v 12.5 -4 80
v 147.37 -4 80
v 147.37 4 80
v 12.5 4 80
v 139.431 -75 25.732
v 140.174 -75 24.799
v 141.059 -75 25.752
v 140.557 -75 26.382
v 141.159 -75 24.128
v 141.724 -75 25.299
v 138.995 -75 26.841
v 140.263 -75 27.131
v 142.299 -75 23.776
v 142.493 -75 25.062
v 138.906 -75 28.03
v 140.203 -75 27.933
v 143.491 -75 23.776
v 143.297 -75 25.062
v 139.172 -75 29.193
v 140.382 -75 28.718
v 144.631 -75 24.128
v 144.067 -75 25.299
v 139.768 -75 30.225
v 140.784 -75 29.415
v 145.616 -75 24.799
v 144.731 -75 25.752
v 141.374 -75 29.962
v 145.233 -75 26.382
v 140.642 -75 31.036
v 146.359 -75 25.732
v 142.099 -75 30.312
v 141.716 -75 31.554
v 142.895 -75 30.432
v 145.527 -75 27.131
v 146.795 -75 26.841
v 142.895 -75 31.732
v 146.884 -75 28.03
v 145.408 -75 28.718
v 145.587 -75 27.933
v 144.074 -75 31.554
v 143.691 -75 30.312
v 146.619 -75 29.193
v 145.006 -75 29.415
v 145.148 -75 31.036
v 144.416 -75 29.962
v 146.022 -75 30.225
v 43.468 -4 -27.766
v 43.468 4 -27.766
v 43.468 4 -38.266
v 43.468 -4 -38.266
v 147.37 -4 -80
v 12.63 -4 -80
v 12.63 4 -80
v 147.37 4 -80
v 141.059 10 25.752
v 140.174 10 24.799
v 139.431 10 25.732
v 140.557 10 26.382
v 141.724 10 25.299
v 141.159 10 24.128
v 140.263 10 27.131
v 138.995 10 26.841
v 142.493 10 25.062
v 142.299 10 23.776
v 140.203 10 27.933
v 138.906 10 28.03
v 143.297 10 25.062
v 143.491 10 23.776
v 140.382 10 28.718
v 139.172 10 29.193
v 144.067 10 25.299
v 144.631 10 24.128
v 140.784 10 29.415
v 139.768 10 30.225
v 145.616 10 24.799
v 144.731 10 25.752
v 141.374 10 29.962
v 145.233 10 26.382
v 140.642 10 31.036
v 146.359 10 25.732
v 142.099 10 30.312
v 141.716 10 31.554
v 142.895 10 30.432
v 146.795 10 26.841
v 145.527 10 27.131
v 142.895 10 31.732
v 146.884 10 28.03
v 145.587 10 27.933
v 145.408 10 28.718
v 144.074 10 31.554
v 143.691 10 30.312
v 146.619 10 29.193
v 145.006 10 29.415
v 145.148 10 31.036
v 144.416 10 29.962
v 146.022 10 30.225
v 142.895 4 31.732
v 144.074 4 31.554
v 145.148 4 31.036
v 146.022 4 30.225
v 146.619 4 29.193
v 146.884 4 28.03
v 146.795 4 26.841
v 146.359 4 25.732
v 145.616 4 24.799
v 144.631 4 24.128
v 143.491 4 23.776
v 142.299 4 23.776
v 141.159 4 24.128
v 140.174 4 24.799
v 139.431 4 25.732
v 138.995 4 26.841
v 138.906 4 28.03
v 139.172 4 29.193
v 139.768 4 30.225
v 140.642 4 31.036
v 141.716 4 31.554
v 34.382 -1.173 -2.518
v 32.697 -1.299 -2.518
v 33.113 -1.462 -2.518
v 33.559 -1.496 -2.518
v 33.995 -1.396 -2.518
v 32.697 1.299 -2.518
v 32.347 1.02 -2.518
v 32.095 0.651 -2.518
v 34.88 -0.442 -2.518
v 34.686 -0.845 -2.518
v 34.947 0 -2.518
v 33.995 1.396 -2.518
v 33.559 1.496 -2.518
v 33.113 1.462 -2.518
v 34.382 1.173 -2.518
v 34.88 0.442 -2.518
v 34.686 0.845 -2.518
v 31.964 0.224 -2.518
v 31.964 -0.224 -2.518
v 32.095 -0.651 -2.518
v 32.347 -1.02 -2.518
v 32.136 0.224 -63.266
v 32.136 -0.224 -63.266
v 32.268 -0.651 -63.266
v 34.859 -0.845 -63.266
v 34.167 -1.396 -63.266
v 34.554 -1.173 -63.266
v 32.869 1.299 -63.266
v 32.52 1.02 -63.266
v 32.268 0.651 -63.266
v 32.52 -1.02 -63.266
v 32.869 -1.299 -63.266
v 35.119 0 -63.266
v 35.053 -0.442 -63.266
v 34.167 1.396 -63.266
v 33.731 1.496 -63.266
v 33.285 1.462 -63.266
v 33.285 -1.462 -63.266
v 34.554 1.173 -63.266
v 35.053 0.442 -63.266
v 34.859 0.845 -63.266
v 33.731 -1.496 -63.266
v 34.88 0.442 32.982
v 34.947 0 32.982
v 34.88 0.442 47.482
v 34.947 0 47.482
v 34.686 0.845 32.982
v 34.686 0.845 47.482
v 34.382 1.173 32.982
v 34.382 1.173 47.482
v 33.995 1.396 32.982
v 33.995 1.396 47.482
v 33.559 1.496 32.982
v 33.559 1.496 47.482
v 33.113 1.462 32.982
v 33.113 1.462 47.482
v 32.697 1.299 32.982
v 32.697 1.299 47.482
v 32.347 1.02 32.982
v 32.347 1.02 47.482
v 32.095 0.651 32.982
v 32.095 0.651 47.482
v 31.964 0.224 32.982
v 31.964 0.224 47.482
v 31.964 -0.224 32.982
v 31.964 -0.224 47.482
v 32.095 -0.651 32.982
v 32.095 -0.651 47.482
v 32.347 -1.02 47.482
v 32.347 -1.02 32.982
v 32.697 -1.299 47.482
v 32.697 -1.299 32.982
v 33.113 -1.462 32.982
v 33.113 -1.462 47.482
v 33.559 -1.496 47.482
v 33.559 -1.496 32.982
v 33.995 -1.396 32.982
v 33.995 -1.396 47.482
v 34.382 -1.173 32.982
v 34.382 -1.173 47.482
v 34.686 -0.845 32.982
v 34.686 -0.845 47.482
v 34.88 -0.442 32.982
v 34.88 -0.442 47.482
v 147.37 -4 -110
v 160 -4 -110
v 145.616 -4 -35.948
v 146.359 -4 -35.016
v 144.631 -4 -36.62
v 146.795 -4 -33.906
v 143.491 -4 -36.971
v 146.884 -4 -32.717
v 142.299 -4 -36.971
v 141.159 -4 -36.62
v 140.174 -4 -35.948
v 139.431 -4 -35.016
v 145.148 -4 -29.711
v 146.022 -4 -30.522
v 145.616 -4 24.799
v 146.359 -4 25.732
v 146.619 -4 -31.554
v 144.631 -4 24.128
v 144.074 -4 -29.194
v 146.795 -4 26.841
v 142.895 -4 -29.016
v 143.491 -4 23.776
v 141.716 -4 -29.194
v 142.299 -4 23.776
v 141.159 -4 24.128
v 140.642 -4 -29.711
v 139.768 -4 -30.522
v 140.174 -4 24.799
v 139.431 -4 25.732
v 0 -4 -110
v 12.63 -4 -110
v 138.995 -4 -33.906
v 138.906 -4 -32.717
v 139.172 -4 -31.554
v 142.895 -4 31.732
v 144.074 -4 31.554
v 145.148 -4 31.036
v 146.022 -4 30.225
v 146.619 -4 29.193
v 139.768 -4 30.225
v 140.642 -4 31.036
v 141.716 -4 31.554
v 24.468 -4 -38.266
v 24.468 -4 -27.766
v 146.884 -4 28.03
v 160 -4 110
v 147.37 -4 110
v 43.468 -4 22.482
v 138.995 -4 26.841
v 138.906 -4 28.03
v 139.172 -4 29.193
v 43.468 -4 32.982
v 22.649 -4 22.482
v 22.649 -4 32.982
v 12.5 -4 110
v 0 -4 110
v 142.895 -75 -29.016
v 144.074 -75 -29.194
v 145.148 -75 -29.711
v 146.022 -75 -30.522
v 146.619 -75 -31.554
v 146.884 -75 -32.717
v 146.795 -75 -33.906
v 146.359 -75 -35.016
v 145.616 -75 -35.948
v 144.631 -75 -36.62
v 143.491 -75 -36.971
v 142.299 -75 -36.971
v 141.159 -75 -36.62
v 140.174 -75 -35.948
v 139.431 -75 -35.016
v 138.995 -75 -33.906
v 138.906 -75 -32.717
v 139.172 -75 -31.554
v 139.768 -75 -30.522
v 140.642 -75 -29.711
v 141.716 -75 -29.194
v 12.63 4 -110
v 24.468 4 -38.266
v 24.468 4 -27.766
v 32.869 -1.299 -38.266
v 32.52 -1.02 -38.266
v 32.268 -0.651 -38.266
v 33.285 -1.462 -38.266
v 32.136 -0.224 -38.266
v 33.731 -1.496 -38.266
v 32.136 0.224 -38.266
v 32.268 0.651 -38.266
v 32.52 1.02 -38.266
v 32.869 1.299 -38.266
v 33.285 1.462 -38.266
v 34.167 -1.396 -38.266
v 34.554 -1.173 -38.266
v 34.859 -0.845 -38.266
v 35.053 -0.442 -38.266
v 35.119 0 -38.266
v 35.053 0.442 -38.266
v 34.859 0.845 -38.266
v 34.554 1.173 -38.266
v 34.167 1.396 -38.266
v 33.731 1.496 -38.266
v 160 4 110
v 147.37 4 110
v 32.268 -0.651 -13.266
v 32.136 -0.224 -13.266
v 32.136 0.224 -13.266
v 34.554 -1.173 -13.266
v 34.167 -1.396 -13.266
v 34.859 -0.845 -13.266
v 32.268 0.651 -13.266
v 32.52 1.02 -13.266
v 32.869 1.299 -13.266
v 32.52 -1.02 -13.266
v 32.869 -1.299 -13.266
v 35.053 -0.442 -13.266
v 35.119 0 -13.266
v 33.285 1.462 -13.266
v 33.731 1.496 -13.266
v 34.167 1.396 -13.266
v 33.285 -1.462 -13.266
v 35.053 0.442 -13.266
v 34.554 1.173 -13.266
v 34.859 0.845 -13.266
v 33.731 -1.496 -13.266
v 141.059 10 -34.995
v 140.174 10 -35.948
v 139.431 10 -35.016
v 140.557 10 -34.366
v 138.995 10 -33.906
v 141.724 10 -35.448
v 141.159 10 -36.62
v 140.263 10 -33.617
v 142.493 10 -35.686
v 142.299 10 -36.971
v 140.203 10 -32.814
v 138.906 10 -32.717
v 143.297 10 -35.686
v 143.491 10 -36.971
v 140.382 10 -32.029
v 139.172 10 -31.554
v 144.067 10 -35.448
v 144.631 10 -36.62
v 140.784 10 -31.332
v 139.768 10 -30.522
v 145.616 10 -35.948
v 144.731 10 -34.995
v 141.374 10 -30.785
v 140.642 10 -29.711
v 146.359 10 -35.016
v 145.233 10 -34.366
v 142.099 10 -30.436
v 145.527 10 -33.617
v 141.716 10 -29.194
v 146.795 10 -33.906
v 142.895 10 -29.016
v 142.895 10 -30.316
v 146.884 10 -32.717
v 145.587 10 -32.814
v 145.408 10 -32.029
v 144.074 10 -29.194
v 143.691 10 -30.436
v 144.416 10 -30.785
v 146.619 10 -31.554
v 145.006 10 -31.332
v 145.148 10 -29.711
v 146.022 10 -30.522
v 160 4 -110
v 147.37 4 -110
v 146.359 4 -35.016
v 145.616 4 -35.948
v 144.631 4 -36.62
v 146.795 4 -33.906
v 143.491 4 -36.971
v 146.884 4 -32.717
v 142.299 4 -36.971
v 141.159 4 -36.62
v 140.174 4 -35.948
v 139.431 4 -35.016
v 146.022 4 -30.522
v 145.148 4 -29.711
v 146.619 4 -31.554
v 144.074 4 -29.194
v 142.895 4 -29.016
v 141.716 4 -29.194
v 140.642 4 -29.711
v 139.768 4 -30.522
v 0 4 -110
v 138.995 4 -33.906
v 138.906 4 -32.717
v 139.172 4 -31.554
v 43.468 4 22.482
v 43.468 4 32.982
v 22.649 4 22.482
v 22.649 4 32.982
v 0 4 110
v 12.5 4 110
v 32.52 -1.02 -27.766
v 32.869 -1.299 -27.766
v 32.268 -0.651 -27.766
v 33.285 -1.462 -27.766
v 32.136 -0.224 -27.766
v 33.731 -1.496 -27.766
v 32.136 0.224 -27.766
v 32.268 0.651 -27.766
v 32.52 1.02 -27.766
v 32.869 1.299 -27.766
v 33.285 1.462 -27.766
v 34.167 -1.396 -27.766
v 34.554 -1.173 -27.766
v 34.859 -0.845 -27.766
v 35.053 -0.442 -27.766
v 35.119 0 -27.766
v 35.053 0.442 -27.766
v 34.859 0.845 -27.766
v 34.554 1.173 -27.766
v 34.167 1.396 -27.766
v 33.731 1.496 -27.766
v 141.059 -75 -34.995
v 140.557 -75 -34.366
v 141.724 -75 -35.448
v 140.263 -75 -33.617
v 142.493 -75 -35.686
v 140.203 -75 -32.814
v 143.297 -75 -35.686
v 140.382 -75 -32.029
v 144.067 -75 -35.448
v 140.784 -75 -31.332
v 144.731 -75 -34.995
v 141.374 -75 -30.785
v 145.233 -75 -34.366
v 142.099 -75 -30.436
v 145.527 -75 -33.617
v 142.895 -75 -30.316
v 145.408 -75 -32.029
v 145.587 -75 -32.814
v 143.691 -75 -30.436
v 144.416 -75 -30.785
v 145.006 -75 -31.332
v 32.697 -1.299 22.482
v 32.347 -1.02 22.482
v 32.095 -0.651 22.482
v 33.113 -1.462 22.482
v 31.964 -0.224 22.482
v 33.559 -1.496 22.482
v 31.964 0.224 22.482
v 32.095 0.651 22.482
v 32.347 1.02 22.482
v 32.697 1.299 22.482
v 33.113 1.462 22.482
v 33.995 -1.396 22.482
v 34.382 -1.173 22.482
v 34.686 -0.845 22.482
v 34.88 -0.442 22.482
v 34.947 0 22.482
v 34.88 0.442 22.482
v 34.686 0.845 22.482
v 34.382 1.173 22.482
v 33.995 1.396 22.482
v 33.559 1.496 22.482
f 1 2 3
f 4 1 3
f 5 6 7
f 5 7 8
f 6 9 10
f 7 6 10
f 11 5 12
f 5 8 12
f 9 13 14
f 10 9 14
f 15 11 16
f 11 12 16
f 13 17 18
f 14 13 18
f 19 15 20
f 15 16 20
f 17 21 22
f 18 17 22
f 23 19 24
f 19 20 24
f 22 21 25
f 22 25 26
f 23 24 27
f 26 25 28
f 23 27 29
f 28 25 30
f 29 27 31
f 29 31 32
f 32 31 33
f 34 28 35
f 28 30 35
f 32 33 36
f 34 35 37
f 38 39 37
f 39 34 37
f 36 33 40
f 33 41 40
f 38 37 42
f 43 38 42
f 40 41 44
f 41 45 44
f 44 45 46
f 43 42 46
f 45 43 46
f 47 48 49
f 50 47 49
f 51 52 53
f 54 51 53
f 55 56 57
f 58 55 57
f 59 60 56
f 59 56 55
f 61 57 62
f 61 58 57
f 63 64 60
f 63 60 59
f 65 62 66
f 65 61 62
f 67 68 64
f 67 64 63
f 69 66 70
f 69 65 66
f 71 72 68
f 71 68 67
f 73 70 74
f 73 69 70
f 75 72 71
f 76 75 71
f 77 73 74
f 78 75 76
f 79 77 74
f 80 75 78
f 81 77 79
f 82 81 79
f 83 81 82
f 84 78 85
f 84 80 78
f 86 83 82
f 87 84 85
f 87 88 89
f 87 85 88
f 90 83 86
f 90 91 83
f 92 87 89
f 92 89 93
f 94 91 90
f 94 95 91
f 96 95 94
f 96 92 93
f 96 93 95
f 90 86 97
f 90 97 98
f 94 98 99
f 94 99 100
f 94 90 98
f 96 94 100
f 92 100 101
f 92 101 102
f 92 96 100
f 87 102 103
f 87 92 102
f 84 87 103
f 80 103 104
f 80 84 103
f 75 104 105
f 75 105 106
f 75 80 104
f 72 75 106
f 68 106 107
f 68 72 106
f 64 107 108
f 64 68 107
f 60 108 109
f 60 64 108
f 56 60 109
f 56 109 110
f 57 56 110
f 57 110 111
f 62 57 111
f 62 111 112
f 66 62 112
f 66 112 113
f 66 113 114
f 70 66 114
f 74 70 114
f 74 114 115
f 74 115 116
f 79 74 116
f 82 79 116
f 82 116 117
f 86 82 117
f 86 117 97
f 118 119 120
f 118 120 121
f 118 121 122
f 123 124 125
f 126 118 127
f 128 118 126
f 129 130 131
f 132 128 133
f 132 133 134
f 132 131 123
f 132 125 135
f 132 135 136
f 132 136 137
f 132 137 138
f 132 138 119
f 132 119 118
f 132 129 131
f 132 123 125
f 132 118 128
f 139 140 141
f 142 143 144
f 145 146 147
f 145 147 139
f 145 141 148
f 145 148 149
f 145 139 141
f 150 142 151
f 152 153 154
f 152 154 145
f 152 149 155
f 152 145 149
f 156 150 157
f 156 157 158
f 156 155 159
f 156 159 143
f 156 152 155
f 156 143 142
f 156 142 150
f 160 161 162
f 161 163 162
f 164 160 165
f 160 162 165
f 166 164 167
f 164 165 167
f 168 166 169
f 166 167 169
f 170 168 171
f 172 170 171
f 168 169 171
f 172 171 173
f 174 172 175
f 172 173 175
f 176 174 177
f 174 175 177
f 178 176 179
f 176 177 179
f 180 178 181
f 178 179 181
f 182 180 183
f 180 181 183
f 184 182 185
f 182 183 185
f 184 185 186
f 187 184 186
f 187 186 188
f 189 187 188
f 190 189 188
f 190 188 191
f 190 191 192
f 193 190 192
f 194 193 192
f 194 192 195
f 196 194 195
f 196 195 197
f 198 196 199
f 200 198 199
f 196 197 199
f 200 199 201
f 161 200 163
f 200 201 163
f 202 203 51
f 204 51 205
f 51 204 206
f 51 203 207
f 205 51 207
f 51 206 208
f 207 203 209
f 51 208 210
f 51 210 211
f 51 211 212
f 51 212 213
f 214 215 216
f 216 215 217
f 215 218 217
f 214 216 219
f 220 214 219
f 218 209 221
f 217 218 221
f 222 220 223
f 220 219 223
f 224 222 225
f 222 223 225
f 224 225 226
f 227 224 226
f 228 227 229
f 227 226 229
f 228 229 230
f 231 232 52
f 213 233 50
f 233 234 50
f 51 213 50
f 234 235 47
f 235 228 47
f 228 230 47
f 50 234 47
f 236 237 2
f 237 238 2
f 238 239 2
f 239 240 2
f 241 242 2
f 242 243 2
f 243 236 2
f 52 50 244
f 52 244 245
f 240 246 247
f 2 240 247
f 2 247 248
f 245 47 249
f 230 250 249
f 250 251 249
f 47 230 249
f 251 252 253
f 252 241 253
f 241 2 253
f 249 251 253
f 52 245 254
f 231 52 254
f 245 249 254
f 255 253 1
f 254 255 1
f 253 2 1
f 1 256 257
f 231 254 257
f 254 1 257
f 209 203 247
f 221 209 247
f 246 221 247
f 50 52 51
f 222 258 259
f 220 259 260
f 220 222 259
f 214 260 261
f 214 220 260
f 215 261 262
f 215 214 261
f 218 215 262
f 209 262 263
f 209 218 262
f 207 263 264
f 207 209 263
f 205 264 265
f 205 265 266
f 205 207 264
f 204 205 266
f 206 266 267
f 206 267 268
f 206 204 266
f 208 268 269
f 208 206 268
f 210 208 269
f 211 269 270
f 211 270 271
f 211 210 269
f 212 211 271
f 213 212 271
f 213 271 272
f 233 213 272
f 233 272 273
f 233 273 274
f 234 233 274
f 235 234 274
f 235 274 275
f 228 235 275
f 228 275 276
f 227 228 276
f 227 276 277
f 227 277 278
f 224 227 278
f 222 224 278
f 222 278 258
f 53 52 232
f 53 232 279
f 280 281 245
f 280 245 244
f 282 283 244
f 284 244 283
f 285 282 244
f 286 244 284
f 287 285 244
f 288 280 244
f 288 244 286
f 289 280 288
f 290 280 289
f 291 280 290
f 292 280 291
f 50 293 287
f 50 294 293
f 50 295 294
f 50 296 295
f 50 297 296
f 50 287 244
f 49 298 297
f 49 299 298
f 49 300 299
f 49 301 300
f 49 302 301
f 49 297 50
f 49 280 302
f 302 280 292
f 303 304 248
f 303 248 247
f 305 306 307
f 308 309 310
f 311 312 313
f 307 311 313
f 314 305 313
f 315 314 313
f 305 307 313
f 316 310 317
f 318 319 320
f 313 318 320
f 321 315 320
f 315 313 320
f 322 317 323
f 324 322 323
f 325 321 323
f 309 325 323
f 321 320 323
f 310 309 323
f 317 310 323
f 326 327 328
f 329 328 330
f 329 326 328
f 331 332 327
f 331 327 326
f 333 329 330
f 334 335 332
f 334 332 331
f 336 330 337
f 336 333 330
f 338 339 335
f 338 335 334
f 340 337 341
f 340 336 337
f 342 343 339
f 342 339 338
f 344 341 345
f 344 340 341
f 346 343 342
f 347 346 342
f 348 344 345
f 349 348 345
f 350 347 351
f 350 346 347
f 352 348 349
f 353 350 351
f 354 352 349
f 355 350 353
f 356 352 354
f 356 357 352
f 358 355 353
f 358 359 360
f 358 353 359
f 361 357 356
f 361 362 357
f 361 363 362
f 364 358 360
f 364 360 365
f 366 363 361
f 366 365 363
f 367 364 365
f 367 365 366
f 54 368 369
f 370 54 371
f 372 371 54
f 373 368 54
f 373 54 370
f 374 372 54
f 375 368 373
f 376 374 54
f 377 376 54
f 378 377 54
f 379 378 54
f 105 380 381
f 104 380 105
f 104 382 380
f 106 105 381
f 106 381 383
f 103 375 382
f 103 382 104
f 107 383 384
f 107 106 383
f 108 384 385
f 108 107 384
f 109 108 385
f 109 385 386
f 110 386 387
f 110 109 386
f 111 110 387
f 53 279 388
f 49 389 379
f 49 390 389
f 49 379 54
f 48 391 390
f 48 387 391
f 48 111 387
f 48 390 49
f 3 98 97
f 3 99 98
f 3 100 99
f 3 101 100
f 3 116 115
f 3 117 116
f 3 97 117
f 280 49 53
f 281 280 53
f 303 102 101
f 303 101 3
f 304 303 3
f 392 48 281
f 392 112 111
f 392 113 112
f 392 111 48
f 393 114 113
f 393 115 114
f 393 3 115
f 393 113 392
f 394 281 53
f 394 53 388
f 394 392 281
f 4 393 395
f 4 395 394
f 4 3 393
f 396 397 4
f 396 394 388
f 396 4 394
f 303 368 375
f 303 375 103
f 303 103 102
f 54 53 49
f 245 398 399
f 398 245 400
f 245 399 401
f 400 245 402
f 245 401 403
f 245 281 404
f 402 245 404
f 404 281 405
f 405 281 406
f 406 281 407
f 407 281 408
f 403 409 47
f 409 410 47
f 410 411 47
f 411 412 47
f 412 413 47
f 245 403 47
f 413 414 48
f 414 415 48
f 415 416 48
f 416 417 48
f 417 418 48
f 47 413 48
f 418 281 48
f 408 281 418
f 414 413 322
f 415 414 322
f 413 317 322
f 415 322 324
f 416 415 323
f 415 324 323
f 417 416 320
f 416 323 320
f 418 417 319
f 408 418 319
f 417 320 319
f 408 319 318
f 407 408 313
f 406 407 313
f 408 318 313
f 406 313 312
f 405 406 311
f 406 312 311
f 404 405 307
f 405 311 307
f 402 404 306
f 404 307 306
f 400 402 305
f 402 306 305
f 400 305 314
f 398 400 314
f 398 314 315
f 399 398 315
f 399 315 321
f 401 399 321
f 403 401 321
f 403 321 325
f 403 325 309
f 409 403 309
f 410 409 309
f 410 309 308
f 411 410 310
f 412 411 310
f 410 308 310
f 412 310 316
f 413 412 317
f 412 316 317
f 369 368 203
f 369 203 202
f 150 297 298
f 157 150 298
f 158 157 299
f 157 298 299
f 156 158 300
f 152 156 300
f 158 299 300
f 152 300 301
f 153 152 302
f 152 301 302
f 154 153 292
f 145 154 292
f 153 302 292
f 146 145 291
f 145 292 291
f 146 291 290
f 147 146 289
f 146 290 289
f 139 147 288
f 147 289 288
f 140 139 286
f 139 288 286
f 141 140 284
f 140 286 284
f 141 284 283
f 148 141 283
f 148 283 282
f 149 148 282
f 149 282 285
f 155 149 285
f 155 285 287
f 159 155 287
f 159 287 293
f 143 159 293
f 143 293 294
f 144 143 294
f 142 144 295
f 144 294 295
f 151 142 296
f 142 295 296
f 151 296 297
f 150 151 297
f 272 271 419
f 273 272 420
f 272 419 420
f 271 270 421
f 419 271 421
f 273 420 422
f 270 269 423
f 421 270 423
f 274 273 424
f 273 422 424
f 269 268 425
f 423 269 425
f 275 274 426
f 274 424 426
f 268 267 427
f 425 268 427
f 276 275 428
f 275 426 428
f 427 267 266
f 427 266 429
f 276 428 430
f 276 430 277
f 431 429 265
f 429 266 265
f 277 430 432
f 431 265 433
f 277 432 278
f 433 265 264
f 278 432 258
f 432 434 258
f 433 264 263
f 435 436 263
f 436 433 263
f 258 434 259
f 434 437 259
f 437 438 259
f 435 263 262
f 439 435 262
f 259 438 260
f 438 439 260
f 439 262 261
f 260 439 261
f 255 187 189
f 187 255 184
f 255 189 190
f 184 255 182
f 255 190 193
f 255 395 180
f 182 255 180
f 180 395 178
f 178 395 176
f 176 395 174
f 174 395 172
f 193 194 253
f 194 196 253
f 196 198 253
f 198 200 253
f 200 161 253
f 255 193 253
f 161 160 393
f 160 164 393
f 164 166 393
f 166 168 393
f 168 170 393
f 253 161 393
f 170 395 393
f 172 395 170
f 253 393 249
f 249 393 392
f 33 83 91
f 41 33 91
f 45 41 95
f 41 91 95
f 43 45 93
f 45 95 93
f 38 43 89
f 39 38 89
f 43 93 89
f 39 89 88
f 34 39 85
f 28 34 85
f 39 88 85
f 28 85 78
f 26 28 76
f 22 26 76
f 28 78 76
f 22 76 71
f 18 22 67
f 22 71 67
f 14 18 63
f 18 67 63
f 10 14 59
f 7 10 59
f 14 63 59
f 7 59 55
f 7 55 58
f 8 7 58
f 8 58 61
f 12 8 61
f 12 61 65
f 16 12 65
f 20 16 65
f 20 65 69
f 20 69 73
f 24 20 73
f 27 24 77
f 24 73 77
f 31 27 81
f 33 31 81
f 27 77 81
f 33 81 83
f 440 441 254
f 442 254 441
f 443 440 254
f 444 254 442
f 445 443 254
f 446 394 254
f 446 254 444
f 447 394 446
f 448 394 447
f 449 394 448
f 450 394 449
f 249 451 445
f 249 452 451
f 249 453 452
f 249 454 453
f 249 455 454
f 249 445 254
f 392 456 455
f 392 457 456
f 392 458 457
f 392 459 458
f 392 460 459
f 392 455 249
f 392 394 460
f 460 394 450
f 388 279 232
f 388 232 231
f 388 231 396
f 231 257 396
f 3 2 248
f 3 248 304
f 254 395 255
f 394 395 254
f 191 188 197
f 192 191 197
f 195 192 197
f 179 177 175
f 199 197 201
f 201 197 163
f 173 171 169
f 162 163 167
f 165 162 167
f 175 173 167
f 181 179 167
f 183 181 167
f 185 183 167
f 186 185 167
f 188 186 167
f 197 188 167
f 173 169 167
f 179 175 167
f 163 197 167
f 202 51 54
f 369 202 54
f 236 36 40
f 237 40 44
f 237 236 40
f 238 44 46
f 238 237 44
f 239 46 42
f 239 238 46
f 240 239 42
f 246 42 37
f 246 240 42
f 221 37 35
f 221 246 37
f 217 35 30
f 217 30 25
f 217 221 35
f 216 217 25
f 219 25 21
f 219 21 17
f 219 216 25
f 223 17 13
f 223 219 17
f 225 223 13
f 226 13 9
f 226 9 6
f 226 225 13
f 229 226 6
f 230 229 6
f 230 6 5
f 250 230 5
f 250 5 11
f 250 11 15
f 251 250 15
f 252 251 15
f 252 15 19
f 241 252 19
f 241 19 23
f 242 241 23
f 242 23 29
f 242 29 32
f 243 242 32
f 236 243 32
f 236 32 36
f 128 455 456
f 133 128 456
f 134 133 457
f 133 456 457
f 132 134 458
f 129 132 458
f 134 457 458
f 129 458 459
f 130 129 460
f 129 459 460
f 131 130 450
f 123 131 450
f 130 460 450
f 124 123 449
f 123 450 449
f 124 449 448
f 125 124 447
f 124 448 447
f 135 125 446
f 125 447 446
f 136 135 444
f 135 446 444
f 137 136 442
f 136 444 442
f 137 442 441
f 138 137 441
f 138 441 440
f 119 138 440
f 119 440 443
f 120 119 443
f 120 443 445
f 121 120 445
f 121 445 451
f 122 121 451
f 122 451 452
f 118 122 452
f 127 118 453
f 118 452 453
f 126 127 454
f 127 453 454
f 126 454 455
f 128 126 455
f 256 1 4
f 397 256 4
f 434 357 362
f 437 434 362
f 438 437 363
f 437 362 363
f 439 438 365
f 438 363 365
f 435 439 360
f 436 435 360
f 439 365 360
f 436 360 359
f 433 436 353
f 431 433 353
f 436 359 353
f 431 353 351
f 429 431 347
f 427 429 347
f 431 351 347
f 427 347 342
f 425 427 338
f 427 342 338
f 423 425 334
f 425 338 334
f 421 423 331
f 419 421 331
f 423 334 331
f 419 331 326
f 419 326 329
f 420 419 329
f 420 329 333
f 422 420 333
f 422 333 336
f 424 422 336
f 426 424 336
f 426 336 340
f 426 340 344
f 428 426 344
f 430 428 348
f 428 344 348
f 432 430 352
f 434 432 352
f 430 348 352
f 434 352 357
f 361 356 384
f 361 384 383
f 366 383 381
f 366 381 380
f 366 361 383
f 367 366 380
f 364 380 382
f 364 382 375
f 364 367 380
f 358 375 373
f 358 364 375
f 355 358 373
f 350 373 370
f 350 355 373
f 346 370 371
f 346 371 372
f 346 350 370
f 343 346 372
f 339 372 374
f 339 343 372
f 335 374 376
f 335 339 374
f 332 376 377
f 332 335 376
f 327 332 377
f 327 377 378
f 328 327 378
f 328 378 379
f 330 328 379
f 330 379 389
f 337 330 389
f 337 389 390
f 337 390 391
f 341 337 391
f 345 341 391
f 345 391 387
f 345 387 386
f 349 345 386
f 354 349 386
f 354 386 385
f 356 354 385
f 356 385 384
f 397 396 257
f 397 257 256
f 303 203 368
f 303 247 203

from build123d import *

# Parameters (mm, degrees)
SKETCH1_W           = 160
SKETCH1_H           = 8
BOSS_EXTRUDE1_DEPTH = 160
SKETCH2_W           = 12.5
SKETCH2_H           = 8
BOSS_EXTRUDE2_DEPTH = 30
SKETCH3_W           = 12.63
SKETCH3_H           = 8
BOSS_EXTRUDE3_DEPTH = 30
SKETCH4_W           = 12.63
SKETCH4_H           = 8
BOSS_EXTRUDE4_DEPTH = 30
SKETCH5_W           = 12.63
SKETCH5_H           = 8
BOSS_EXTRUDE5_DEPTH = 30
SKETCH6_W           = 19
SKETCH6_H           = 10.5
SKETCH6_W_2         = 20.818922979
CUT_EXTRUDE1_DEPTH  = 10
SKETCH8_R           = 1.5
CUT_EXTRUDE4_DEPTH  = 25
SKETCH9_R           = 1.5
CUT_EXTRUDE5_DEPTH  = 25
BOSS_EXTRUDE6_START = 10
SKETCH10_R          = 4
BOSS_EXTRUDE6_DEPTH = 85
SKETCH13_R          = 2.7
CUT_EXTRUDE6_DEPTH  = 85
SKETCH14_R          = 2.7
CUT_EXTRUDE7_DEPTH  = 85


with BuildPart() as part:
    # Sketch1 → Boss-Extrude1 (new body)
    with BuildSketch(Plane(origin=(0, 0, 0), x_dir=(0, 0, -1), z_dir=(1, 0, 0))):
        Rectangle(SKETCH1_W, SKETCH1_H)
    extrude(amount=BOSS_EXTRUDE1_DEPTH)

    # Sketch2 → Boss-Extrude2 (add)
    with BuildSketch(Plane.XY.offset(80)):
        with Locations((6.25, 0)):
            Rectangle(SKETCH2_W, SKETCH2_H)
    extrude(amount=BOSS_EXTRUDE2_DEPTH)

    # Sketch3 → Boss-Extrude3 (add)
    with BuildSketch(Plane.XY.offset(80)):
        with Locations((153.685, 0)):
            Rectangle(SKETCH3_W, SKETCH3_H)
    extrude(amount=BOSS_EXTRUDE3_DEPTH)

    # Sketch4 → Boss-Extrude4 (add)
    with BuildSketch(Plane(origin=(0, 0, -80), x_dir=(-1, 0, 0), z_dir=(0, 0, -1))):
        with Locations((-153.685, 0)):
            Rectangle(SKETCH4_W, SKETCH4_H)
    extrude(amount=BOSS_EXTRUDE4_DEPTH)

    # Sketch5 → Boss-Extrude5 (add)
    with BuildSketch(Plane(origin=(0, 0, -80), x_dir=(-1, 0, 0), z_dir=(0, 0, -1))):
        with Locations((-6.315, 0)):
            Rectangle(SKETCH5_W, SKETCH5_H)
    extrude(amount=BOSS_EXTRUDE5_DEPTH)

    # Sketch6 → Cut-Extrude1 (cut)
    with BuildSketch(Plane(origin=(0, 4, 0), x_dir=(1, 0, 0), z_dir=(0, 1, 0))):
        with Locations((33.96830463, 33.015847685)):
            Rectangle(SKETCH6_W, SKETCH6_H)
        with Locations((33.058843141, -27.73153178)):
            Rectangle(SKETCH6_W_2, SKETCH6_H)
    extrude(amount=-CUT_EXTRUDE1_DEPTH, mode=Mode.SUBTRACT)

    # Sketch8 → Cut-Extrude4 (cut, symmetric)
    with BuildSketch(Plane.XY.offset(-38.265847685)):
        with Locations((33.619205895, 0)):
            Circle(SKETCH8_R)
    extrude(amount=CUT_EXTRUDE4_DEPTH, both=True, mode=Mode.SUBTRACT)

    # Sketch9 → Cut-Extrude5 (cut, symmetric)
    with BuildSketch(Plane.XY.offset(22.48153178)):
        with Locations((33.446786586, 0)):
            Circle(SKETCH9_R)
    extrude(amount=CUT_EXTRUDE5_DEPTH, both=True, mode=Mode.SUBTRACT)

    # Sketch10 → Boss-Extrude6 (add)
    with BuildSketch(Plane(origin=(0, 0, 0), x_dir=(1, 0, 0), z_dir=(0, 1, 0)).offset(BOSS_EXTRUDE6_START)):
        with Locations(Location((142.895014093, -27.73153178, 0), (0, 0, 270))):
            Circle(SKETCH10_R)
        with Locations(Location((142.895014093, 33.015847685, 0), (0, 0, 270))):
            Circle(SKETCH10_R)
    extrude(amount=-BOSS_EXTRUDE6_DEPTH)

    # Sketch13 → Cut-Extrude6 (cut)
    with BuildSketch(Plane(origin=(0, 10, 0), x_dir=(1, 0, 0), z_dir=(0, 1, 0))):
        with Locations(Location((142.895014093, -27.73153178, 0), (0, 0, 270))):
            Circle(SKETCH13_R)
    extrude(amount=-CUT_EXTRUDE6_DEPTH, mode=Mode.SUBTRACT)

    # Sketch14 → Cut-Extrude7 (cut)
    with BuildSketch(Plane(origin=(0, 10, 0), x_dir=(1, 0, 0), z_dir=(0, 1, 0))):
        with Locations(Location((142.895014093, 33.015847685, 0), (0, 0, 270))):
            Circle(SKETCH14_R)
    extrude(amount=-CUT_EXTRUDE7_DEPTH, mode=Mode.SUBTRACT)


solid = part.part
